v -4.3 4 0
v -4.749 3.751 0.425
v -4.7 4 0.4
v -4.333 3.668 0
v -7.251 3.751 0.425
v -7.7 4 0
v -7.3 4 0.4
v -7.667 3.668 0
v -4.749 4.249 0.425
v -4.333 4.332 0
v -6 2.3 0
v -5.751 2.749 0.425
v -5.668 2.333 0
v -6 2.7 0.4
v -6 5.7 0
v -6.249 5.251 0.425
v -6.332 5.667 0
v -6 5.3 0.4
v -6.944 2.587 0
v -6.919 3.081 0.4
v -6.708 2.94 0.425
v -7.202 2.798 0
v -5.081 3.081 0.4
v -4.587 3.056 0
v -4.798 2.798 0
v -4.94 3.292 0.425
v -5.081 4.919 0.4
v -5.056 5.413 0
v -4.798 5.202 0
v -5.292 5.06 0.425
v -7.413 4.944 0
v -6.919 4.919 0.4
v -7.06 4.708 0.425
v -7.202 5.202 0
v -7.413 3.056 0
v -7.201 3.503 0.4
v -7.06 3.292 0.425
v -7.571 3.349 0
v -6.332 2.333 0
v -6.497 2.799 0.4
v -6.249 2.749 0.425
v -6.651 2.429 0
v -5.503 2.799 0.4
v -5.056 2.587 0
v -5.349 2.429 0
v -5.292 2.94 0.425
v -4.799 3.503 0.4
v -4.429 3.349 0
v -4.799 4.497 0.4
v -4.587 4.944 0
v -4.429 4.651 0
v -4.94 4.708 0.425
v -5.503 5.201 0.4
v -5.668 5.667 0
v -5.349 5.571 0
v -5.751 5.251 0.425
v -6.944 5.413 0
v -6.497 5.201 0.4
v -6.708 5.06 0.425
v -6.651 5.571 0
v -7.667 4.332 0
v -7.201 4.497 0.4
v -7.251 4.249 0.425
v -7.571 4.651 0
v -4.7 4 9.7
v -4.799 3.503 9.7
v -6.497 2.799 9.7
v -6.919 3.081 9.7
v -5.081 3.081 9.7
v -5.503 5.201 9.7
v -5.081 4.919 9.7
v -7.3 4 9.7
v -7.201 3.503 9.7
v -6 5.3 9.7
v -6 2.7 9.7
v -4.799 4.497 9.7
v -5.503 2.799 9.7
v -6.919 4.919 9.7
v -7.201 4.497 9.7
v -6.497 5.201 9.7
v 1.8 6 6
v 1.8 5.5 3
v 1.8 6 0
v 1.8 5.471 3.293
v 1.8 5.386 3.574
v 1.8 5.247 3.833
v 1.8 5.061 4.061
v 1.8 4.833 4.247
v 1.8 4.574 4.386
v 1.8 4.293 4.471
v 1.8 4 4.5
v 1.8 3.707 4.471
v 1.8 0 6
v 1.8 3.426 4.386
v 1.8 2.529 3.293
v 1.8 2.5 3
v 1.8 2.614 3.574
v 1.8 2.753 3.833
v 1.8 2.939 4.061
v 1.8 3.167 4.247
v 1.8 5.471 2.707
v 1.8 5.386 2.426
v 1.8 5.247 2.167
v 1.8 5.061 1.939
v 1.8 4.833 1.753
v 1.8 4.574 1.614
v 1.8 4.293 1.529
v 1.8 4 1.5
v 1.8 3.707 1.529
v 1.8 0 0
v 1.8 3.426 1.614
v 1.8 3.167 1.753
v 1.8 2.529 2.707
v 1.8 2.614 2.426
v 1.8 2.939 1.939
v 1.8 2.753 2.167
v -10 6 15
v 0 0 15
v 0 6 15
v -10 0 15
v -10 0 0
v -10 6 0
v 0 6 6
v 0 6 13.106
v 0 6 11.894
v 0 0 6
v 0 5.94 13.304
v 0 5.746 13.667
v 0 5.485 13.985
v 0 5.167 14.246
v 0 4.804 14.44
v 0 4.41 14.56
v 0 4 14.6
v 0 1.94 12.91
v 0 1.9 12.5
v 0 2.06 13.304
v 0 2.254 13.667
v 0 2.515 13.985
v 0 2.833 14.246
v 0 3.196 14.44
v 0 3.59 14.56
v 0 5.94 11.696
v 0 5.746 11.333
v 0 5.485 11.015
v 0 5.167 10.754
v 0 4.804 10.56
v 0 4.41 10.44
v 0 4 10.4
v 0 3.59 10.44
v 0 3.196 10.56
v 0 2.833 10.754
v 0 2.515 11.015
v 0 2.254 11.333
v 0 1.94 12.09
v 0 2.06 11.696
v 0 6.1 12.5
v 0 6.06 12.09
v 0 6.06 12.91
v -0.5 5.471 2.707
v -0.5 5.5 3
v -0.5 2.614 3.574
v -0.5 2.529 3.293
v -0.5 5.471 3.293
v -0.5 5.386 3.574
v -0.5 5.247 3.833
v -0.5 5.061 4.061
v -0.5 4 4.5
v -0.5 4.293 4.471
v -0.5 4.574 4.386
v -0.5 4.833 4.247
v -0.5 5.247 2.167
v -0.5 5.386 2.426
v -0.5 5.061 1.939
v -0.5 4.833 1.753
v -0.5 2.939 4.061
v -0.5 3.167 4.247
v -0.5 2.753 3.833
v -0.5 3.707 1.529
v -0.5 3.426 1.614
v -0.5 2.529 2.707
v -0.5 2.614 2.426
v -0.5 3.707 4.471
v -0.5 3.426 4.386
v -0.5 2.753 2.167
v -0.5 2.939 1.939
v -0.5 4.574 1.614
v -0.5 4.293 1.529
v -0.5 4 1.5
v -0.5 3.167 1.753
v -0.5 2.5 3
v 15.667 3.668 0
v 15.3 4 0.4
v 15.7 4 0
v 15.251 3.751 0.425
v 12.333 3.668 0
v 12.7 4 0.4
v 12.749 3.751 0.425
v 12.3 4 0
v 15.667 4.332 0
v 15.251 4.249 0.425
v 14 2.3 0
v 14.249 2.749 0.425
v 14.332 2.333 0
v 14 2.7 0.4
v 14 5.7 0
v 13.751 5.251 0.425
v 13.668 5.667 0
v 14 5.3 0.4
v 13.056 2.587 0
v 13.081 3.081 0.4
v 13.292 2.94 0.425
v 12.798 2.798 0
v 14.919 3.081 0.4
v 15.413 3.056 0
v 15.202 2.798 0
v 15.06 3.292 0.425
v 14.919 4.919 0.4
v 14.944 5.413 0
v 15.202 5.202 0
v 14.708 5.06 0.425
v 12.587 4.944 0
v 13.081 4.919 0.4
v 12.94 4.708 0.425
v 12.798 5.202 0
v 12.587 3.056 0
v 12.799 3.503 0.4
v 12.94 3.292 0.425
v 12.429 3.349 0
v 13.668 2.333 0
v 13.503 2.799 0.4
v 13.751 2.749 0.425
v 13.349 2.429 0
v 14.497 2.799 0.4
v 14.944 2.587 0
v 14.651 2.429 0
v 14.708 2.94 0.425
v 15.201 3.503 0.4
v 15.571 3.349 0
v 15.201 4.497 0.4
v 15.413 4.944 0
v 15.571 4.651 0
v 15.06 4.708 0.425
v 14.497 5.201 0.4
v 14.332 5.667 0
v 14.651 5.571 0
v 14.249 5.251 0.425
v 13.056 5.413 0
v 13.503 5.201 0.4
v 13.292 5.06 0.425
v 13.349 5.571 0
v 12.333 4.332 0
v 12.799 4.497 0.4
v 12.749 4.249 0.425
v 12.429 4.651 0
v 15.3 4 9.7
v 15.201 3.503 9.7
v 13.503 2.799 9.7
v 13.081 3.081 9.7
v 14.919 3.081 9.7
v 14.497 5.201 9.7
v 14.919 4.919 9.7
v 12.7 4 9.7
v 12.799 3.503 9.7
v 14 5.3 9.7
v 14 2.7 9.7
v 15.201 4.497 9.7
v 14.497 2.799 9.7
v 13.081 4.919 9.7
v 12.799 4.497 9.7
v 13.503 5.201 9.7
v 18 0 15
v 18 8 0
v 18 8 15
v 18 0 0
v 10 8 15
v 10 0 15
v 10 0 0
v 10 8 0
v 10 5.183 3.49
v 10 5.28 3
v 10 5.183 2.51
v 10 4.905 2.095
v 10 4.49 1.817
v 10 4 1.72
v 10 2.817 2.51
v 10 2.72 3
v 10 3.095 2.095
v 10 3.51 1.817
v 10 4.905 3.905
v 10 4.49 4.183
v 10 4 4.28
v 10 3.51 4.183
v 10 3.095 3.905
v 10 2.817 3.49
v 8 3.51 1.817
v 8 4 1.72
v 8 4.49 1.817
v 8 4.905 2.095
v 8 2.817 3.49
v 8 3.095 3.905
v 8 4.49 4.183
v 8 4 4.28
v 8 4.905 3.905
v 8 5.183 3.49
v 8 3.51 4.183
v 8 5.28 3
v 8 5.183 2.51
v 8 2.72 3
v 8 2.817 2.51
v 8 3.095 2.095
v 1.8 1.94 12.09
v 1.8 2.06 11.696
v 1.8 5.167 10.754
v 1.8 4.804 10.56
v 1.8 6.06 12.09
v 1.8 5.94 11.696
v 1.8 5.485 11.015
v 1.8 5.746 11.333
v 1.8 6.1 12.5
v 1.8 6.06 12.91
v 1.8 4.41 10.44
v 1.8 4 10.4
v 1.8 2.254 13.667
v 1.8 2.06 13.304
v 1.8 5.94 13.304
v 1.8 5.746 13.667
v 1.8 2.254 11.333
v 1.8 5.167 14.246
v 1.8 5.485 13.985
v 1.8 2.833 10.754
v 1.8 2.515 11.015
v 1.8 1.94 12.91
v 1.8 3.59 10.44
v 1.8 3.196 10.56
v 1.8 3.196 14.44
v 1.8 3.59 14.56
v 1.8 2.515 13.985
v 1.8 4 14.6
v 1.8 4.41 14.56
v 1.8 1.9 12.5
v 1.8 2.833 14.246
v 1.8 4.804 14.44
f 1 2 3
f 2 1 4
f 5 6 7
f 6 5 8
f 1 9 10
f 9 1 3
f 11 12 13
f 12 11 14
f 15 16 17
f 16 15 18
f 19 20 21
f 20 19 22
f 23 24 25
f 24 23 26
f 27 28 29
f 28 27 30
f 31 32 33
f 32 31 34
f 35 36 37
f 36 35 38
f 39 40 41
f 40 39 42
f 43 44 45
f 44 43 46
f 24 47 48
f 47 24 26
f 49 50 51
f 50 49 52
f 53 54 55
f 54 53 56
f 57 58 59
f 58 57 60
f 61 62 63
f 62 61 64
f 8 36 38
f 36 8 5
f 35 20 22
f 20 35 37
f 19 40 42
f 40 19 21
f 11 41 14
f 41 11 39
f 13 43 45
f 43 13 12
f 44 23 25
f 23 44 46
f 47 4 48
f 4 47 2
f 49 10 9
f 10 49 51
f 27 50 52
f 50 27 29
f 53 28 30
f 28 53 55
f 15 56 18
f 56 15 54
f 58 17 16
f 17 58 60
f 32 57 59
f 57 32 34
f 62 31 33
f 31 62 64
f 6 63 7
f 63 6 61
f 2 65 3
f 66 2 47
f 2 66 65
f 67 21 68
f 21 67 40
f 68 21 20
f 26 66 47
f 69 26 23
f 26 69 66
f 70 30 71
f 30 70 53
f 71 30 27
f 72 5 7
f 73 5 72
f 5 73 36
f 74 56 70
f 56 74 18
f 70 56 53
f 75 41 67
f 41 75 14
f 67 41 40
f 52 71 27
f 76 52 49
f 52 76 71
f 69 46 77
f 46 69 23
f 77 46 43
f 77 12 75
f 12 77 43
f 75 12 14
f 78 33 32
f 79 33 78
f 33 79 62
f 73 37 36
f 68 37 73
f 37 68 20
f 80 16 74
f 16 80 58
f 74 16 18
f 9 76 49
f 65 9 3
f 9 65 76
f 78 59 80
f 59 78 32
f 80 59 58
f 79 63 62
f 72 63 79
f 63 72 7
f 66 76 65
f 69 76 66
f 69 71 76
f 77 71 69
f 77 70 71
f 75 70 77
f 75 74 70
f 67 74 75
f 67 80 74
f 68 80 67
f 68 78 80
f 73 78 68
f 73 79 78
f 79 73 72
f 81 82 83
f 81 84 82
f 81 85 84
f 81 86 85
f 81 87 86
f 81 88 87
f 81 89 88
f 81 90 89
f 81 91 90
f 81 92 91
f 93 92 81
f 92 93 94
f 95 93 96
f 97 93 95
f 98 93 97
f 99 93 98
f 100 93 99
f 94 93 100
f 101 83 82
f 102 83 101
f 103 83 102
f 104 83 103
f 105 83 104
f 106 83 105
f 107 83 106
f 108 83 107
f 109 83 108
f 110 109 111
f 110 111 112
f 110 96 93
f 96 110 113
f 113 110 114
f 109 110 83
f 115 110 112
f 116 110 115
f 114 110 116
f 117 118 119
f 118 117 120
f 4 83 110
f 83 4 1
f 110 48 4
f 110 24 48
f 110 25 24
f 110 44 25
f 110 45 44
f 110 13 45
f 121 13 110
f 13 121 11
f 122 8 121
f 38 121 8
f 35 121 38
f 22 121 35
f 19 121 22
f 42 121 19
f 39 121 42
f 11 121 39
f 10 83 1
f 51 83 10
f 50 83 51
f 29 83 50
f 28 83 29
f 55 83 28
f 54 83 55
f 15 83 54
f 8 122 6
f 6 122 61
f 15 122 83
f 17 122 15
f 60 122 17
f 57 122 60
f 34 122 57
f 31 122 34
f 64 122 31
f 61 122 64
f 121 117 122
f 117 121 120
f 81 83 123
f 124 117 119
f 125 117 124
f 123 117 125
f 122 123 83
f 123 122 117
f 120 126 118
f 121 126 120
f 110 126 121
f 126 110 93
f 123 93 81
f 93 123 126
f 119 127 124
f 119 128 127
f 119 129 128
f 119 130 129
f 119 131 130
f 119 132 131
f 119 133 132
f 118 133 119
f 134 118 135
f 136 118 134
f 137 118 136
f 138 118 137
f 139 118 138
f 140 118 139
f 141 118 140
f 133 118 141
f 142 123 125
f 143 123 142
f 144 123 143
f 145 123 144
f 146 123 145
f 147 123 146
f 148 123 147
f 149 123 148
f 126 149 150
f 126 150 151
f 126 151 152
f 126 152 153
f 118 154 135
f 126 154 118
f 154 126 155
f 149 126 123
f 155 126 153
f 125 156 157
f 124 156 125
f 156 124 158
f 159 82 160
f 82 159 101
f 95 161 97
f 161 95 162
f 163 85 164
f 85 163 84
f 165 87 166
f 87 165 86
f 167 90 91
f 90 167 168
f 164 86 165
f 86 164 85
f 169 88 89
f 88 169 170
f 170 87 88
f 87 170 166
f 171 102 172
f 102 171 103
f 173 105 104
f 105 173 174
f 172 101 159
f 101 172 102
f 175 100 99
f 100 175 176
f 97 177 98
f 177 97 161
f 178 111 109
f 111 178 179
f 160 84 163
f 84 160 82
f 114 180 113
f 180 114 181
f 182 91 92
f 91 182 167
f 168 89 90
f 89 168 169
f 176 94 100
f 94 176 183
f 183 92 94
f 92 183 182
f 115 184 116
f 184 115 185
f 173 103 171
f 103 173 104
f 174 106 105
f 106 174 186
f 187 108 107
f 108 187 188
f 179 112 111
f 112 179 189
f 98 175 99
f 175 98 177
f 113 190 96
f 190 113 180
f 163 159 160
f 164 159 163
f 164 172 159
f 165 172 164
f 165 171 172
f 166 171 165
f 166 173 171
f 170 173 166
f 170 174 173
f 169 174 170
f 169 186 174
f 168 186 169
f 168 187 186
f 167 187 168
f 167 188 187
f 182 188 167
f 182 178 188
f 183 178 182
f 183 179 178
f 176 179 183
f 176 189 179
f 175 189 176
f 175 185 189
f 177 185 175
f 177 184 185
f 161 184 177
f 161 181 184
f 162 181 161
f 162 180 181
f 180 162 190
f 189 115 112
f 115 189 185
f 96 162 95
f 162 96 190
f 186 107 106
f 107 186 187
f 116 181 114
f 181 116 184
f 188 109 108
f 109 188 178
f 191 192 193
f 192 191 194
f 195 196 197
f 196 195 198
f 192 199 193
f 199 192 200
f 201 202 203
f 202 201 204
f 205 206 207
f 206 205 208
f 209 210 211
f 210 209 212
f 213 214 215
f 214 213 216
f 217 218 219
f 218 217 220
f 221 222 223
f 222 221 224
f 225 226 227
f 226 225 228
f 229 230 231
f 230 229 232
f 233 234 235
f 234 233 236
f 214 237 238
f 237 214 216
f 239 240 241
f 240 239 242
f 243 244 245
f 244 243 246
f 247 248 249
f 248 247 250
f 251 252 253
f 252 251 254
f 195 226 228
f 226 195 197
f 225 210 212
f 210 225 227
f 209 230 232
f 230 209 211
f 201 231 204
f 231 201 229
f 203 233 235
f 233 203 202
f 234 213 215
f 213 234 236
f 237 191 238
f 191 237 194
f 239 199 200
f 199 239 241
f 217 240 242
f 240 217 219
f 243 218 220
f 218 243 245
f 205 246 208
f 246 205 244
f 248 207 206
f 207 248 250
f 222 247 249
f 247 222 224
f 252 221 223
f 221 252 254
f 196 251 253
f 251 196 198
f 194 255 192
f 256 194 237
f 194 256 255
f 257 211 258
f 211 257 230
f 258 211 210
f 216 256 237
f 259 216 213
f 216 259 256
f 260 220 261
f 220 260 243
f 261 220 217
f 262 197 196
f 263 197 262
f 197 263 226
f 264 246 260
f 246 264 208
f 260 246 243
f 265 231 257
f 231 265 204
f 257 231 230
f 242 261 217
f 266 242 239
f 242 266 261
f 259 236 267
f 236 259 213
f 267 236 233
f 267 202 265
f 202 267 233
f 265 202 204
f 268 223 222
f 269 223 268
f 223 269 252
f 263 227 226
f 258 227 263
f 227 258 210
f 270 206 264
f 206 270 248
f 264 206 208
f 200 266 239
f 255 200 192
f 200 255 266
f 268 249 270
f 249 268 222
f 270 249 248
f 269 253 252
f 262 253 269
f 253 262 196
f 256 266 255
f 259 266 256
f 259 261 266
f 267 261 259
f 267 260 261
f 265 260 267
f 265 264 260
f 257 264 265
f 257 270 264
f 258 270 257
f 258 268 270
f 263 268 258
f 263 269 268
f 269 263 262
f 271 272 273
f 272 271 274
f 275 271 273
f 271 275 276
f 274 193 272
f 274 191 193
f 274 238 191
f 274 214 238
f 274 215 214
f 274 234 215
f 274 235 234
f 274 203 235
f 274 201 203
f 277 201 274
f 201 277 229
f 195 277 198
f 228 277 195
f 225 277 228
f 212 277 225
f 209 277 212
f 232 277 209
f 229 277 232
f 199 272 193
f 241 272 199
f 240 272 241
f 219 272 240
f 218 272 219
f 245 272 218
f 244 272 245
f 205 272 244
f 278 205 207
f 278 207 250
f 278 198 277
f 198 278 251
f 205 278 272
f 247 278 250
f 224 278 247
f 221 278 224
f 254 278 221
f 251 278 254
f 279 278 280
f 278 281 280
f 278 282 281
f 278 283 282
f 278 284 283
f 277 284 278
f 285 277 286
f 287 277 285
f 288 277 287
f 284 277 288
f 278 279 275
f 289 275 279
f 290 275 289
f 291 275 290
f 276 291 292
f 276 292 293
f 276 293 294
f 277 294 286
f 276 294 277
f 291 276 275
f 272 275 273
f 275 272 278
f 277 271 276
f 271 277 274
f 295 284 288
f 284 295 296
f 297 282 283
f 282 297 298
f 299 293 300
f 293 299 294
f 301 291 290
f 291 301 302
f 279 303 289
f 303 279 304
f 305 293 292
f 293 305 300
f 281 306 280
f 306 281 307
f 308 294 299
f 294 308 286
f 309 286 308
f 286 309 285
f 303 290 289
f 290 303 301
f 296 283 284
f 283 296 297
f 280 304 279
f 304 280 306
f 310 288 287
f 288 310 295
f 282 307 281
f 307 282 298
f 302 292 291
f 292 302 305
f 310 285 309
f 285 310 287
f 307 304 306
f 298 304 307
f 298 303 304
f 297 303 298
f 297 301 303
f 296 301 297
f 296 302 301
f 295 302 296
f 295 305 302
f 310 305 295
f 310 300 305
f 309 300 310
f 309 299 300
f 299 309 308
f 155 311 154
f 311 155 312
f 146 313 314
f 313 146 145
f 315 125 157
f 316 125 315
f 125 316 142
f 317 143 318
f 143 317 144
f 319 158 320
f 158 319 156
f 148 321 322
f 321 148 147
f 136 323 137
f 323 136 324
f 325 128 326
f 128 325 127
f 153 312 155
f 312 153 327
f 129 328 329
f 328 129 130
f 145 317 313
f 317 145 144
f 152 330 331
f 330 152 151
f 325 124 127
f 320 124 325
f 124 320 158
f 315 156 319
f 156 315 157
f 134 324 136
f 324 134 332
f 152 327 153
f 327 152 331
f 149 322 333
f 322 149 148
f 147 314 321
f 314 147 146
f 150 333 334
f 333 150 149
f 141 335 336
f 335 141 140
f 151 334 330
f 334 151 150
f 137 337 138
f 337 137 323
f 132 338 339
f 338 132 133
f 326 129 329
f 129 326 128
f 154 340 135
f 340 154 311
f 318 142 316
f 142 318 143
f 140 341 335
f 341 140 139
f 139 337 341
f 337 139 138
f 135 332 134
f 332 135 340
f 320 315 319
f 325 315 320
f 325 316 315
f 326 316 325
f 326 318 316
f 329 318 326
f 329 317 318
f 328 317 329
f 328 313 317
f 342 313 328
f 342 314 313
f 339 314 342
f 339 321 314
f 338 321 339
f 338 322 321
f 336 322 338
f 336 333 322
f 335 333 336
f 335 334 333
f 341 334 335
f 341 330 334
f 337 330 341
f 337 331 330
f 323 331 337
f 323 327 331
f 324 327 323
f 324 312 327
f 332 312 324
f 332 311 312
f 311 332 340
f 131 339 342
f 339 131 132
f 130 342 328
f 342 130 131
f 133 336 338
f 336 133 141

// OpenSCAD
base = 6;
R = 2.1;

difference() {
    translate([-10, 0, 0])
        cube([11.8, 6, base + 9]);
    translate([0, 0, base])
        cube([1.8, 8, 9]);
    translate([2, 4, base * .5])
        rotate([0, -90, 0])
            cylinder(r = 1.5, h = 2.5, $fn = 32);
    translate([-6, 4, -2])
        rotate([180, 0, 0])
            sarakineji_hole();
}
translate([0, 4, base + 6.5])
    rotate([0, 90, 0])
        cylinder(r = R, h = 1.8, $fn = 32);

translate([8, 0, 0]) {
    difference() {
        translate([2, 0, 0])
            cube([8, 8, base + 9]);
        translate([6, 4, -2])
            rotate([180, 0, 0])
                sarakineji_hole();
    }
    translate([2, 4, base * .5])
        rotate([0, -90, 0])
            cylinder(r = 1.28, h = 2, $fn = 16);
}

module sarakineji_hole () {
    union() {
        translate([0, 0, -3.7])
            cylinder(r1 = 0, r2 = 3.7, h = 3.7, $fn = 32);
        translate([0, 0, -11.7])
            cylinder(r = 1.3, h = 11.7, $fn = 16);
    }
}
